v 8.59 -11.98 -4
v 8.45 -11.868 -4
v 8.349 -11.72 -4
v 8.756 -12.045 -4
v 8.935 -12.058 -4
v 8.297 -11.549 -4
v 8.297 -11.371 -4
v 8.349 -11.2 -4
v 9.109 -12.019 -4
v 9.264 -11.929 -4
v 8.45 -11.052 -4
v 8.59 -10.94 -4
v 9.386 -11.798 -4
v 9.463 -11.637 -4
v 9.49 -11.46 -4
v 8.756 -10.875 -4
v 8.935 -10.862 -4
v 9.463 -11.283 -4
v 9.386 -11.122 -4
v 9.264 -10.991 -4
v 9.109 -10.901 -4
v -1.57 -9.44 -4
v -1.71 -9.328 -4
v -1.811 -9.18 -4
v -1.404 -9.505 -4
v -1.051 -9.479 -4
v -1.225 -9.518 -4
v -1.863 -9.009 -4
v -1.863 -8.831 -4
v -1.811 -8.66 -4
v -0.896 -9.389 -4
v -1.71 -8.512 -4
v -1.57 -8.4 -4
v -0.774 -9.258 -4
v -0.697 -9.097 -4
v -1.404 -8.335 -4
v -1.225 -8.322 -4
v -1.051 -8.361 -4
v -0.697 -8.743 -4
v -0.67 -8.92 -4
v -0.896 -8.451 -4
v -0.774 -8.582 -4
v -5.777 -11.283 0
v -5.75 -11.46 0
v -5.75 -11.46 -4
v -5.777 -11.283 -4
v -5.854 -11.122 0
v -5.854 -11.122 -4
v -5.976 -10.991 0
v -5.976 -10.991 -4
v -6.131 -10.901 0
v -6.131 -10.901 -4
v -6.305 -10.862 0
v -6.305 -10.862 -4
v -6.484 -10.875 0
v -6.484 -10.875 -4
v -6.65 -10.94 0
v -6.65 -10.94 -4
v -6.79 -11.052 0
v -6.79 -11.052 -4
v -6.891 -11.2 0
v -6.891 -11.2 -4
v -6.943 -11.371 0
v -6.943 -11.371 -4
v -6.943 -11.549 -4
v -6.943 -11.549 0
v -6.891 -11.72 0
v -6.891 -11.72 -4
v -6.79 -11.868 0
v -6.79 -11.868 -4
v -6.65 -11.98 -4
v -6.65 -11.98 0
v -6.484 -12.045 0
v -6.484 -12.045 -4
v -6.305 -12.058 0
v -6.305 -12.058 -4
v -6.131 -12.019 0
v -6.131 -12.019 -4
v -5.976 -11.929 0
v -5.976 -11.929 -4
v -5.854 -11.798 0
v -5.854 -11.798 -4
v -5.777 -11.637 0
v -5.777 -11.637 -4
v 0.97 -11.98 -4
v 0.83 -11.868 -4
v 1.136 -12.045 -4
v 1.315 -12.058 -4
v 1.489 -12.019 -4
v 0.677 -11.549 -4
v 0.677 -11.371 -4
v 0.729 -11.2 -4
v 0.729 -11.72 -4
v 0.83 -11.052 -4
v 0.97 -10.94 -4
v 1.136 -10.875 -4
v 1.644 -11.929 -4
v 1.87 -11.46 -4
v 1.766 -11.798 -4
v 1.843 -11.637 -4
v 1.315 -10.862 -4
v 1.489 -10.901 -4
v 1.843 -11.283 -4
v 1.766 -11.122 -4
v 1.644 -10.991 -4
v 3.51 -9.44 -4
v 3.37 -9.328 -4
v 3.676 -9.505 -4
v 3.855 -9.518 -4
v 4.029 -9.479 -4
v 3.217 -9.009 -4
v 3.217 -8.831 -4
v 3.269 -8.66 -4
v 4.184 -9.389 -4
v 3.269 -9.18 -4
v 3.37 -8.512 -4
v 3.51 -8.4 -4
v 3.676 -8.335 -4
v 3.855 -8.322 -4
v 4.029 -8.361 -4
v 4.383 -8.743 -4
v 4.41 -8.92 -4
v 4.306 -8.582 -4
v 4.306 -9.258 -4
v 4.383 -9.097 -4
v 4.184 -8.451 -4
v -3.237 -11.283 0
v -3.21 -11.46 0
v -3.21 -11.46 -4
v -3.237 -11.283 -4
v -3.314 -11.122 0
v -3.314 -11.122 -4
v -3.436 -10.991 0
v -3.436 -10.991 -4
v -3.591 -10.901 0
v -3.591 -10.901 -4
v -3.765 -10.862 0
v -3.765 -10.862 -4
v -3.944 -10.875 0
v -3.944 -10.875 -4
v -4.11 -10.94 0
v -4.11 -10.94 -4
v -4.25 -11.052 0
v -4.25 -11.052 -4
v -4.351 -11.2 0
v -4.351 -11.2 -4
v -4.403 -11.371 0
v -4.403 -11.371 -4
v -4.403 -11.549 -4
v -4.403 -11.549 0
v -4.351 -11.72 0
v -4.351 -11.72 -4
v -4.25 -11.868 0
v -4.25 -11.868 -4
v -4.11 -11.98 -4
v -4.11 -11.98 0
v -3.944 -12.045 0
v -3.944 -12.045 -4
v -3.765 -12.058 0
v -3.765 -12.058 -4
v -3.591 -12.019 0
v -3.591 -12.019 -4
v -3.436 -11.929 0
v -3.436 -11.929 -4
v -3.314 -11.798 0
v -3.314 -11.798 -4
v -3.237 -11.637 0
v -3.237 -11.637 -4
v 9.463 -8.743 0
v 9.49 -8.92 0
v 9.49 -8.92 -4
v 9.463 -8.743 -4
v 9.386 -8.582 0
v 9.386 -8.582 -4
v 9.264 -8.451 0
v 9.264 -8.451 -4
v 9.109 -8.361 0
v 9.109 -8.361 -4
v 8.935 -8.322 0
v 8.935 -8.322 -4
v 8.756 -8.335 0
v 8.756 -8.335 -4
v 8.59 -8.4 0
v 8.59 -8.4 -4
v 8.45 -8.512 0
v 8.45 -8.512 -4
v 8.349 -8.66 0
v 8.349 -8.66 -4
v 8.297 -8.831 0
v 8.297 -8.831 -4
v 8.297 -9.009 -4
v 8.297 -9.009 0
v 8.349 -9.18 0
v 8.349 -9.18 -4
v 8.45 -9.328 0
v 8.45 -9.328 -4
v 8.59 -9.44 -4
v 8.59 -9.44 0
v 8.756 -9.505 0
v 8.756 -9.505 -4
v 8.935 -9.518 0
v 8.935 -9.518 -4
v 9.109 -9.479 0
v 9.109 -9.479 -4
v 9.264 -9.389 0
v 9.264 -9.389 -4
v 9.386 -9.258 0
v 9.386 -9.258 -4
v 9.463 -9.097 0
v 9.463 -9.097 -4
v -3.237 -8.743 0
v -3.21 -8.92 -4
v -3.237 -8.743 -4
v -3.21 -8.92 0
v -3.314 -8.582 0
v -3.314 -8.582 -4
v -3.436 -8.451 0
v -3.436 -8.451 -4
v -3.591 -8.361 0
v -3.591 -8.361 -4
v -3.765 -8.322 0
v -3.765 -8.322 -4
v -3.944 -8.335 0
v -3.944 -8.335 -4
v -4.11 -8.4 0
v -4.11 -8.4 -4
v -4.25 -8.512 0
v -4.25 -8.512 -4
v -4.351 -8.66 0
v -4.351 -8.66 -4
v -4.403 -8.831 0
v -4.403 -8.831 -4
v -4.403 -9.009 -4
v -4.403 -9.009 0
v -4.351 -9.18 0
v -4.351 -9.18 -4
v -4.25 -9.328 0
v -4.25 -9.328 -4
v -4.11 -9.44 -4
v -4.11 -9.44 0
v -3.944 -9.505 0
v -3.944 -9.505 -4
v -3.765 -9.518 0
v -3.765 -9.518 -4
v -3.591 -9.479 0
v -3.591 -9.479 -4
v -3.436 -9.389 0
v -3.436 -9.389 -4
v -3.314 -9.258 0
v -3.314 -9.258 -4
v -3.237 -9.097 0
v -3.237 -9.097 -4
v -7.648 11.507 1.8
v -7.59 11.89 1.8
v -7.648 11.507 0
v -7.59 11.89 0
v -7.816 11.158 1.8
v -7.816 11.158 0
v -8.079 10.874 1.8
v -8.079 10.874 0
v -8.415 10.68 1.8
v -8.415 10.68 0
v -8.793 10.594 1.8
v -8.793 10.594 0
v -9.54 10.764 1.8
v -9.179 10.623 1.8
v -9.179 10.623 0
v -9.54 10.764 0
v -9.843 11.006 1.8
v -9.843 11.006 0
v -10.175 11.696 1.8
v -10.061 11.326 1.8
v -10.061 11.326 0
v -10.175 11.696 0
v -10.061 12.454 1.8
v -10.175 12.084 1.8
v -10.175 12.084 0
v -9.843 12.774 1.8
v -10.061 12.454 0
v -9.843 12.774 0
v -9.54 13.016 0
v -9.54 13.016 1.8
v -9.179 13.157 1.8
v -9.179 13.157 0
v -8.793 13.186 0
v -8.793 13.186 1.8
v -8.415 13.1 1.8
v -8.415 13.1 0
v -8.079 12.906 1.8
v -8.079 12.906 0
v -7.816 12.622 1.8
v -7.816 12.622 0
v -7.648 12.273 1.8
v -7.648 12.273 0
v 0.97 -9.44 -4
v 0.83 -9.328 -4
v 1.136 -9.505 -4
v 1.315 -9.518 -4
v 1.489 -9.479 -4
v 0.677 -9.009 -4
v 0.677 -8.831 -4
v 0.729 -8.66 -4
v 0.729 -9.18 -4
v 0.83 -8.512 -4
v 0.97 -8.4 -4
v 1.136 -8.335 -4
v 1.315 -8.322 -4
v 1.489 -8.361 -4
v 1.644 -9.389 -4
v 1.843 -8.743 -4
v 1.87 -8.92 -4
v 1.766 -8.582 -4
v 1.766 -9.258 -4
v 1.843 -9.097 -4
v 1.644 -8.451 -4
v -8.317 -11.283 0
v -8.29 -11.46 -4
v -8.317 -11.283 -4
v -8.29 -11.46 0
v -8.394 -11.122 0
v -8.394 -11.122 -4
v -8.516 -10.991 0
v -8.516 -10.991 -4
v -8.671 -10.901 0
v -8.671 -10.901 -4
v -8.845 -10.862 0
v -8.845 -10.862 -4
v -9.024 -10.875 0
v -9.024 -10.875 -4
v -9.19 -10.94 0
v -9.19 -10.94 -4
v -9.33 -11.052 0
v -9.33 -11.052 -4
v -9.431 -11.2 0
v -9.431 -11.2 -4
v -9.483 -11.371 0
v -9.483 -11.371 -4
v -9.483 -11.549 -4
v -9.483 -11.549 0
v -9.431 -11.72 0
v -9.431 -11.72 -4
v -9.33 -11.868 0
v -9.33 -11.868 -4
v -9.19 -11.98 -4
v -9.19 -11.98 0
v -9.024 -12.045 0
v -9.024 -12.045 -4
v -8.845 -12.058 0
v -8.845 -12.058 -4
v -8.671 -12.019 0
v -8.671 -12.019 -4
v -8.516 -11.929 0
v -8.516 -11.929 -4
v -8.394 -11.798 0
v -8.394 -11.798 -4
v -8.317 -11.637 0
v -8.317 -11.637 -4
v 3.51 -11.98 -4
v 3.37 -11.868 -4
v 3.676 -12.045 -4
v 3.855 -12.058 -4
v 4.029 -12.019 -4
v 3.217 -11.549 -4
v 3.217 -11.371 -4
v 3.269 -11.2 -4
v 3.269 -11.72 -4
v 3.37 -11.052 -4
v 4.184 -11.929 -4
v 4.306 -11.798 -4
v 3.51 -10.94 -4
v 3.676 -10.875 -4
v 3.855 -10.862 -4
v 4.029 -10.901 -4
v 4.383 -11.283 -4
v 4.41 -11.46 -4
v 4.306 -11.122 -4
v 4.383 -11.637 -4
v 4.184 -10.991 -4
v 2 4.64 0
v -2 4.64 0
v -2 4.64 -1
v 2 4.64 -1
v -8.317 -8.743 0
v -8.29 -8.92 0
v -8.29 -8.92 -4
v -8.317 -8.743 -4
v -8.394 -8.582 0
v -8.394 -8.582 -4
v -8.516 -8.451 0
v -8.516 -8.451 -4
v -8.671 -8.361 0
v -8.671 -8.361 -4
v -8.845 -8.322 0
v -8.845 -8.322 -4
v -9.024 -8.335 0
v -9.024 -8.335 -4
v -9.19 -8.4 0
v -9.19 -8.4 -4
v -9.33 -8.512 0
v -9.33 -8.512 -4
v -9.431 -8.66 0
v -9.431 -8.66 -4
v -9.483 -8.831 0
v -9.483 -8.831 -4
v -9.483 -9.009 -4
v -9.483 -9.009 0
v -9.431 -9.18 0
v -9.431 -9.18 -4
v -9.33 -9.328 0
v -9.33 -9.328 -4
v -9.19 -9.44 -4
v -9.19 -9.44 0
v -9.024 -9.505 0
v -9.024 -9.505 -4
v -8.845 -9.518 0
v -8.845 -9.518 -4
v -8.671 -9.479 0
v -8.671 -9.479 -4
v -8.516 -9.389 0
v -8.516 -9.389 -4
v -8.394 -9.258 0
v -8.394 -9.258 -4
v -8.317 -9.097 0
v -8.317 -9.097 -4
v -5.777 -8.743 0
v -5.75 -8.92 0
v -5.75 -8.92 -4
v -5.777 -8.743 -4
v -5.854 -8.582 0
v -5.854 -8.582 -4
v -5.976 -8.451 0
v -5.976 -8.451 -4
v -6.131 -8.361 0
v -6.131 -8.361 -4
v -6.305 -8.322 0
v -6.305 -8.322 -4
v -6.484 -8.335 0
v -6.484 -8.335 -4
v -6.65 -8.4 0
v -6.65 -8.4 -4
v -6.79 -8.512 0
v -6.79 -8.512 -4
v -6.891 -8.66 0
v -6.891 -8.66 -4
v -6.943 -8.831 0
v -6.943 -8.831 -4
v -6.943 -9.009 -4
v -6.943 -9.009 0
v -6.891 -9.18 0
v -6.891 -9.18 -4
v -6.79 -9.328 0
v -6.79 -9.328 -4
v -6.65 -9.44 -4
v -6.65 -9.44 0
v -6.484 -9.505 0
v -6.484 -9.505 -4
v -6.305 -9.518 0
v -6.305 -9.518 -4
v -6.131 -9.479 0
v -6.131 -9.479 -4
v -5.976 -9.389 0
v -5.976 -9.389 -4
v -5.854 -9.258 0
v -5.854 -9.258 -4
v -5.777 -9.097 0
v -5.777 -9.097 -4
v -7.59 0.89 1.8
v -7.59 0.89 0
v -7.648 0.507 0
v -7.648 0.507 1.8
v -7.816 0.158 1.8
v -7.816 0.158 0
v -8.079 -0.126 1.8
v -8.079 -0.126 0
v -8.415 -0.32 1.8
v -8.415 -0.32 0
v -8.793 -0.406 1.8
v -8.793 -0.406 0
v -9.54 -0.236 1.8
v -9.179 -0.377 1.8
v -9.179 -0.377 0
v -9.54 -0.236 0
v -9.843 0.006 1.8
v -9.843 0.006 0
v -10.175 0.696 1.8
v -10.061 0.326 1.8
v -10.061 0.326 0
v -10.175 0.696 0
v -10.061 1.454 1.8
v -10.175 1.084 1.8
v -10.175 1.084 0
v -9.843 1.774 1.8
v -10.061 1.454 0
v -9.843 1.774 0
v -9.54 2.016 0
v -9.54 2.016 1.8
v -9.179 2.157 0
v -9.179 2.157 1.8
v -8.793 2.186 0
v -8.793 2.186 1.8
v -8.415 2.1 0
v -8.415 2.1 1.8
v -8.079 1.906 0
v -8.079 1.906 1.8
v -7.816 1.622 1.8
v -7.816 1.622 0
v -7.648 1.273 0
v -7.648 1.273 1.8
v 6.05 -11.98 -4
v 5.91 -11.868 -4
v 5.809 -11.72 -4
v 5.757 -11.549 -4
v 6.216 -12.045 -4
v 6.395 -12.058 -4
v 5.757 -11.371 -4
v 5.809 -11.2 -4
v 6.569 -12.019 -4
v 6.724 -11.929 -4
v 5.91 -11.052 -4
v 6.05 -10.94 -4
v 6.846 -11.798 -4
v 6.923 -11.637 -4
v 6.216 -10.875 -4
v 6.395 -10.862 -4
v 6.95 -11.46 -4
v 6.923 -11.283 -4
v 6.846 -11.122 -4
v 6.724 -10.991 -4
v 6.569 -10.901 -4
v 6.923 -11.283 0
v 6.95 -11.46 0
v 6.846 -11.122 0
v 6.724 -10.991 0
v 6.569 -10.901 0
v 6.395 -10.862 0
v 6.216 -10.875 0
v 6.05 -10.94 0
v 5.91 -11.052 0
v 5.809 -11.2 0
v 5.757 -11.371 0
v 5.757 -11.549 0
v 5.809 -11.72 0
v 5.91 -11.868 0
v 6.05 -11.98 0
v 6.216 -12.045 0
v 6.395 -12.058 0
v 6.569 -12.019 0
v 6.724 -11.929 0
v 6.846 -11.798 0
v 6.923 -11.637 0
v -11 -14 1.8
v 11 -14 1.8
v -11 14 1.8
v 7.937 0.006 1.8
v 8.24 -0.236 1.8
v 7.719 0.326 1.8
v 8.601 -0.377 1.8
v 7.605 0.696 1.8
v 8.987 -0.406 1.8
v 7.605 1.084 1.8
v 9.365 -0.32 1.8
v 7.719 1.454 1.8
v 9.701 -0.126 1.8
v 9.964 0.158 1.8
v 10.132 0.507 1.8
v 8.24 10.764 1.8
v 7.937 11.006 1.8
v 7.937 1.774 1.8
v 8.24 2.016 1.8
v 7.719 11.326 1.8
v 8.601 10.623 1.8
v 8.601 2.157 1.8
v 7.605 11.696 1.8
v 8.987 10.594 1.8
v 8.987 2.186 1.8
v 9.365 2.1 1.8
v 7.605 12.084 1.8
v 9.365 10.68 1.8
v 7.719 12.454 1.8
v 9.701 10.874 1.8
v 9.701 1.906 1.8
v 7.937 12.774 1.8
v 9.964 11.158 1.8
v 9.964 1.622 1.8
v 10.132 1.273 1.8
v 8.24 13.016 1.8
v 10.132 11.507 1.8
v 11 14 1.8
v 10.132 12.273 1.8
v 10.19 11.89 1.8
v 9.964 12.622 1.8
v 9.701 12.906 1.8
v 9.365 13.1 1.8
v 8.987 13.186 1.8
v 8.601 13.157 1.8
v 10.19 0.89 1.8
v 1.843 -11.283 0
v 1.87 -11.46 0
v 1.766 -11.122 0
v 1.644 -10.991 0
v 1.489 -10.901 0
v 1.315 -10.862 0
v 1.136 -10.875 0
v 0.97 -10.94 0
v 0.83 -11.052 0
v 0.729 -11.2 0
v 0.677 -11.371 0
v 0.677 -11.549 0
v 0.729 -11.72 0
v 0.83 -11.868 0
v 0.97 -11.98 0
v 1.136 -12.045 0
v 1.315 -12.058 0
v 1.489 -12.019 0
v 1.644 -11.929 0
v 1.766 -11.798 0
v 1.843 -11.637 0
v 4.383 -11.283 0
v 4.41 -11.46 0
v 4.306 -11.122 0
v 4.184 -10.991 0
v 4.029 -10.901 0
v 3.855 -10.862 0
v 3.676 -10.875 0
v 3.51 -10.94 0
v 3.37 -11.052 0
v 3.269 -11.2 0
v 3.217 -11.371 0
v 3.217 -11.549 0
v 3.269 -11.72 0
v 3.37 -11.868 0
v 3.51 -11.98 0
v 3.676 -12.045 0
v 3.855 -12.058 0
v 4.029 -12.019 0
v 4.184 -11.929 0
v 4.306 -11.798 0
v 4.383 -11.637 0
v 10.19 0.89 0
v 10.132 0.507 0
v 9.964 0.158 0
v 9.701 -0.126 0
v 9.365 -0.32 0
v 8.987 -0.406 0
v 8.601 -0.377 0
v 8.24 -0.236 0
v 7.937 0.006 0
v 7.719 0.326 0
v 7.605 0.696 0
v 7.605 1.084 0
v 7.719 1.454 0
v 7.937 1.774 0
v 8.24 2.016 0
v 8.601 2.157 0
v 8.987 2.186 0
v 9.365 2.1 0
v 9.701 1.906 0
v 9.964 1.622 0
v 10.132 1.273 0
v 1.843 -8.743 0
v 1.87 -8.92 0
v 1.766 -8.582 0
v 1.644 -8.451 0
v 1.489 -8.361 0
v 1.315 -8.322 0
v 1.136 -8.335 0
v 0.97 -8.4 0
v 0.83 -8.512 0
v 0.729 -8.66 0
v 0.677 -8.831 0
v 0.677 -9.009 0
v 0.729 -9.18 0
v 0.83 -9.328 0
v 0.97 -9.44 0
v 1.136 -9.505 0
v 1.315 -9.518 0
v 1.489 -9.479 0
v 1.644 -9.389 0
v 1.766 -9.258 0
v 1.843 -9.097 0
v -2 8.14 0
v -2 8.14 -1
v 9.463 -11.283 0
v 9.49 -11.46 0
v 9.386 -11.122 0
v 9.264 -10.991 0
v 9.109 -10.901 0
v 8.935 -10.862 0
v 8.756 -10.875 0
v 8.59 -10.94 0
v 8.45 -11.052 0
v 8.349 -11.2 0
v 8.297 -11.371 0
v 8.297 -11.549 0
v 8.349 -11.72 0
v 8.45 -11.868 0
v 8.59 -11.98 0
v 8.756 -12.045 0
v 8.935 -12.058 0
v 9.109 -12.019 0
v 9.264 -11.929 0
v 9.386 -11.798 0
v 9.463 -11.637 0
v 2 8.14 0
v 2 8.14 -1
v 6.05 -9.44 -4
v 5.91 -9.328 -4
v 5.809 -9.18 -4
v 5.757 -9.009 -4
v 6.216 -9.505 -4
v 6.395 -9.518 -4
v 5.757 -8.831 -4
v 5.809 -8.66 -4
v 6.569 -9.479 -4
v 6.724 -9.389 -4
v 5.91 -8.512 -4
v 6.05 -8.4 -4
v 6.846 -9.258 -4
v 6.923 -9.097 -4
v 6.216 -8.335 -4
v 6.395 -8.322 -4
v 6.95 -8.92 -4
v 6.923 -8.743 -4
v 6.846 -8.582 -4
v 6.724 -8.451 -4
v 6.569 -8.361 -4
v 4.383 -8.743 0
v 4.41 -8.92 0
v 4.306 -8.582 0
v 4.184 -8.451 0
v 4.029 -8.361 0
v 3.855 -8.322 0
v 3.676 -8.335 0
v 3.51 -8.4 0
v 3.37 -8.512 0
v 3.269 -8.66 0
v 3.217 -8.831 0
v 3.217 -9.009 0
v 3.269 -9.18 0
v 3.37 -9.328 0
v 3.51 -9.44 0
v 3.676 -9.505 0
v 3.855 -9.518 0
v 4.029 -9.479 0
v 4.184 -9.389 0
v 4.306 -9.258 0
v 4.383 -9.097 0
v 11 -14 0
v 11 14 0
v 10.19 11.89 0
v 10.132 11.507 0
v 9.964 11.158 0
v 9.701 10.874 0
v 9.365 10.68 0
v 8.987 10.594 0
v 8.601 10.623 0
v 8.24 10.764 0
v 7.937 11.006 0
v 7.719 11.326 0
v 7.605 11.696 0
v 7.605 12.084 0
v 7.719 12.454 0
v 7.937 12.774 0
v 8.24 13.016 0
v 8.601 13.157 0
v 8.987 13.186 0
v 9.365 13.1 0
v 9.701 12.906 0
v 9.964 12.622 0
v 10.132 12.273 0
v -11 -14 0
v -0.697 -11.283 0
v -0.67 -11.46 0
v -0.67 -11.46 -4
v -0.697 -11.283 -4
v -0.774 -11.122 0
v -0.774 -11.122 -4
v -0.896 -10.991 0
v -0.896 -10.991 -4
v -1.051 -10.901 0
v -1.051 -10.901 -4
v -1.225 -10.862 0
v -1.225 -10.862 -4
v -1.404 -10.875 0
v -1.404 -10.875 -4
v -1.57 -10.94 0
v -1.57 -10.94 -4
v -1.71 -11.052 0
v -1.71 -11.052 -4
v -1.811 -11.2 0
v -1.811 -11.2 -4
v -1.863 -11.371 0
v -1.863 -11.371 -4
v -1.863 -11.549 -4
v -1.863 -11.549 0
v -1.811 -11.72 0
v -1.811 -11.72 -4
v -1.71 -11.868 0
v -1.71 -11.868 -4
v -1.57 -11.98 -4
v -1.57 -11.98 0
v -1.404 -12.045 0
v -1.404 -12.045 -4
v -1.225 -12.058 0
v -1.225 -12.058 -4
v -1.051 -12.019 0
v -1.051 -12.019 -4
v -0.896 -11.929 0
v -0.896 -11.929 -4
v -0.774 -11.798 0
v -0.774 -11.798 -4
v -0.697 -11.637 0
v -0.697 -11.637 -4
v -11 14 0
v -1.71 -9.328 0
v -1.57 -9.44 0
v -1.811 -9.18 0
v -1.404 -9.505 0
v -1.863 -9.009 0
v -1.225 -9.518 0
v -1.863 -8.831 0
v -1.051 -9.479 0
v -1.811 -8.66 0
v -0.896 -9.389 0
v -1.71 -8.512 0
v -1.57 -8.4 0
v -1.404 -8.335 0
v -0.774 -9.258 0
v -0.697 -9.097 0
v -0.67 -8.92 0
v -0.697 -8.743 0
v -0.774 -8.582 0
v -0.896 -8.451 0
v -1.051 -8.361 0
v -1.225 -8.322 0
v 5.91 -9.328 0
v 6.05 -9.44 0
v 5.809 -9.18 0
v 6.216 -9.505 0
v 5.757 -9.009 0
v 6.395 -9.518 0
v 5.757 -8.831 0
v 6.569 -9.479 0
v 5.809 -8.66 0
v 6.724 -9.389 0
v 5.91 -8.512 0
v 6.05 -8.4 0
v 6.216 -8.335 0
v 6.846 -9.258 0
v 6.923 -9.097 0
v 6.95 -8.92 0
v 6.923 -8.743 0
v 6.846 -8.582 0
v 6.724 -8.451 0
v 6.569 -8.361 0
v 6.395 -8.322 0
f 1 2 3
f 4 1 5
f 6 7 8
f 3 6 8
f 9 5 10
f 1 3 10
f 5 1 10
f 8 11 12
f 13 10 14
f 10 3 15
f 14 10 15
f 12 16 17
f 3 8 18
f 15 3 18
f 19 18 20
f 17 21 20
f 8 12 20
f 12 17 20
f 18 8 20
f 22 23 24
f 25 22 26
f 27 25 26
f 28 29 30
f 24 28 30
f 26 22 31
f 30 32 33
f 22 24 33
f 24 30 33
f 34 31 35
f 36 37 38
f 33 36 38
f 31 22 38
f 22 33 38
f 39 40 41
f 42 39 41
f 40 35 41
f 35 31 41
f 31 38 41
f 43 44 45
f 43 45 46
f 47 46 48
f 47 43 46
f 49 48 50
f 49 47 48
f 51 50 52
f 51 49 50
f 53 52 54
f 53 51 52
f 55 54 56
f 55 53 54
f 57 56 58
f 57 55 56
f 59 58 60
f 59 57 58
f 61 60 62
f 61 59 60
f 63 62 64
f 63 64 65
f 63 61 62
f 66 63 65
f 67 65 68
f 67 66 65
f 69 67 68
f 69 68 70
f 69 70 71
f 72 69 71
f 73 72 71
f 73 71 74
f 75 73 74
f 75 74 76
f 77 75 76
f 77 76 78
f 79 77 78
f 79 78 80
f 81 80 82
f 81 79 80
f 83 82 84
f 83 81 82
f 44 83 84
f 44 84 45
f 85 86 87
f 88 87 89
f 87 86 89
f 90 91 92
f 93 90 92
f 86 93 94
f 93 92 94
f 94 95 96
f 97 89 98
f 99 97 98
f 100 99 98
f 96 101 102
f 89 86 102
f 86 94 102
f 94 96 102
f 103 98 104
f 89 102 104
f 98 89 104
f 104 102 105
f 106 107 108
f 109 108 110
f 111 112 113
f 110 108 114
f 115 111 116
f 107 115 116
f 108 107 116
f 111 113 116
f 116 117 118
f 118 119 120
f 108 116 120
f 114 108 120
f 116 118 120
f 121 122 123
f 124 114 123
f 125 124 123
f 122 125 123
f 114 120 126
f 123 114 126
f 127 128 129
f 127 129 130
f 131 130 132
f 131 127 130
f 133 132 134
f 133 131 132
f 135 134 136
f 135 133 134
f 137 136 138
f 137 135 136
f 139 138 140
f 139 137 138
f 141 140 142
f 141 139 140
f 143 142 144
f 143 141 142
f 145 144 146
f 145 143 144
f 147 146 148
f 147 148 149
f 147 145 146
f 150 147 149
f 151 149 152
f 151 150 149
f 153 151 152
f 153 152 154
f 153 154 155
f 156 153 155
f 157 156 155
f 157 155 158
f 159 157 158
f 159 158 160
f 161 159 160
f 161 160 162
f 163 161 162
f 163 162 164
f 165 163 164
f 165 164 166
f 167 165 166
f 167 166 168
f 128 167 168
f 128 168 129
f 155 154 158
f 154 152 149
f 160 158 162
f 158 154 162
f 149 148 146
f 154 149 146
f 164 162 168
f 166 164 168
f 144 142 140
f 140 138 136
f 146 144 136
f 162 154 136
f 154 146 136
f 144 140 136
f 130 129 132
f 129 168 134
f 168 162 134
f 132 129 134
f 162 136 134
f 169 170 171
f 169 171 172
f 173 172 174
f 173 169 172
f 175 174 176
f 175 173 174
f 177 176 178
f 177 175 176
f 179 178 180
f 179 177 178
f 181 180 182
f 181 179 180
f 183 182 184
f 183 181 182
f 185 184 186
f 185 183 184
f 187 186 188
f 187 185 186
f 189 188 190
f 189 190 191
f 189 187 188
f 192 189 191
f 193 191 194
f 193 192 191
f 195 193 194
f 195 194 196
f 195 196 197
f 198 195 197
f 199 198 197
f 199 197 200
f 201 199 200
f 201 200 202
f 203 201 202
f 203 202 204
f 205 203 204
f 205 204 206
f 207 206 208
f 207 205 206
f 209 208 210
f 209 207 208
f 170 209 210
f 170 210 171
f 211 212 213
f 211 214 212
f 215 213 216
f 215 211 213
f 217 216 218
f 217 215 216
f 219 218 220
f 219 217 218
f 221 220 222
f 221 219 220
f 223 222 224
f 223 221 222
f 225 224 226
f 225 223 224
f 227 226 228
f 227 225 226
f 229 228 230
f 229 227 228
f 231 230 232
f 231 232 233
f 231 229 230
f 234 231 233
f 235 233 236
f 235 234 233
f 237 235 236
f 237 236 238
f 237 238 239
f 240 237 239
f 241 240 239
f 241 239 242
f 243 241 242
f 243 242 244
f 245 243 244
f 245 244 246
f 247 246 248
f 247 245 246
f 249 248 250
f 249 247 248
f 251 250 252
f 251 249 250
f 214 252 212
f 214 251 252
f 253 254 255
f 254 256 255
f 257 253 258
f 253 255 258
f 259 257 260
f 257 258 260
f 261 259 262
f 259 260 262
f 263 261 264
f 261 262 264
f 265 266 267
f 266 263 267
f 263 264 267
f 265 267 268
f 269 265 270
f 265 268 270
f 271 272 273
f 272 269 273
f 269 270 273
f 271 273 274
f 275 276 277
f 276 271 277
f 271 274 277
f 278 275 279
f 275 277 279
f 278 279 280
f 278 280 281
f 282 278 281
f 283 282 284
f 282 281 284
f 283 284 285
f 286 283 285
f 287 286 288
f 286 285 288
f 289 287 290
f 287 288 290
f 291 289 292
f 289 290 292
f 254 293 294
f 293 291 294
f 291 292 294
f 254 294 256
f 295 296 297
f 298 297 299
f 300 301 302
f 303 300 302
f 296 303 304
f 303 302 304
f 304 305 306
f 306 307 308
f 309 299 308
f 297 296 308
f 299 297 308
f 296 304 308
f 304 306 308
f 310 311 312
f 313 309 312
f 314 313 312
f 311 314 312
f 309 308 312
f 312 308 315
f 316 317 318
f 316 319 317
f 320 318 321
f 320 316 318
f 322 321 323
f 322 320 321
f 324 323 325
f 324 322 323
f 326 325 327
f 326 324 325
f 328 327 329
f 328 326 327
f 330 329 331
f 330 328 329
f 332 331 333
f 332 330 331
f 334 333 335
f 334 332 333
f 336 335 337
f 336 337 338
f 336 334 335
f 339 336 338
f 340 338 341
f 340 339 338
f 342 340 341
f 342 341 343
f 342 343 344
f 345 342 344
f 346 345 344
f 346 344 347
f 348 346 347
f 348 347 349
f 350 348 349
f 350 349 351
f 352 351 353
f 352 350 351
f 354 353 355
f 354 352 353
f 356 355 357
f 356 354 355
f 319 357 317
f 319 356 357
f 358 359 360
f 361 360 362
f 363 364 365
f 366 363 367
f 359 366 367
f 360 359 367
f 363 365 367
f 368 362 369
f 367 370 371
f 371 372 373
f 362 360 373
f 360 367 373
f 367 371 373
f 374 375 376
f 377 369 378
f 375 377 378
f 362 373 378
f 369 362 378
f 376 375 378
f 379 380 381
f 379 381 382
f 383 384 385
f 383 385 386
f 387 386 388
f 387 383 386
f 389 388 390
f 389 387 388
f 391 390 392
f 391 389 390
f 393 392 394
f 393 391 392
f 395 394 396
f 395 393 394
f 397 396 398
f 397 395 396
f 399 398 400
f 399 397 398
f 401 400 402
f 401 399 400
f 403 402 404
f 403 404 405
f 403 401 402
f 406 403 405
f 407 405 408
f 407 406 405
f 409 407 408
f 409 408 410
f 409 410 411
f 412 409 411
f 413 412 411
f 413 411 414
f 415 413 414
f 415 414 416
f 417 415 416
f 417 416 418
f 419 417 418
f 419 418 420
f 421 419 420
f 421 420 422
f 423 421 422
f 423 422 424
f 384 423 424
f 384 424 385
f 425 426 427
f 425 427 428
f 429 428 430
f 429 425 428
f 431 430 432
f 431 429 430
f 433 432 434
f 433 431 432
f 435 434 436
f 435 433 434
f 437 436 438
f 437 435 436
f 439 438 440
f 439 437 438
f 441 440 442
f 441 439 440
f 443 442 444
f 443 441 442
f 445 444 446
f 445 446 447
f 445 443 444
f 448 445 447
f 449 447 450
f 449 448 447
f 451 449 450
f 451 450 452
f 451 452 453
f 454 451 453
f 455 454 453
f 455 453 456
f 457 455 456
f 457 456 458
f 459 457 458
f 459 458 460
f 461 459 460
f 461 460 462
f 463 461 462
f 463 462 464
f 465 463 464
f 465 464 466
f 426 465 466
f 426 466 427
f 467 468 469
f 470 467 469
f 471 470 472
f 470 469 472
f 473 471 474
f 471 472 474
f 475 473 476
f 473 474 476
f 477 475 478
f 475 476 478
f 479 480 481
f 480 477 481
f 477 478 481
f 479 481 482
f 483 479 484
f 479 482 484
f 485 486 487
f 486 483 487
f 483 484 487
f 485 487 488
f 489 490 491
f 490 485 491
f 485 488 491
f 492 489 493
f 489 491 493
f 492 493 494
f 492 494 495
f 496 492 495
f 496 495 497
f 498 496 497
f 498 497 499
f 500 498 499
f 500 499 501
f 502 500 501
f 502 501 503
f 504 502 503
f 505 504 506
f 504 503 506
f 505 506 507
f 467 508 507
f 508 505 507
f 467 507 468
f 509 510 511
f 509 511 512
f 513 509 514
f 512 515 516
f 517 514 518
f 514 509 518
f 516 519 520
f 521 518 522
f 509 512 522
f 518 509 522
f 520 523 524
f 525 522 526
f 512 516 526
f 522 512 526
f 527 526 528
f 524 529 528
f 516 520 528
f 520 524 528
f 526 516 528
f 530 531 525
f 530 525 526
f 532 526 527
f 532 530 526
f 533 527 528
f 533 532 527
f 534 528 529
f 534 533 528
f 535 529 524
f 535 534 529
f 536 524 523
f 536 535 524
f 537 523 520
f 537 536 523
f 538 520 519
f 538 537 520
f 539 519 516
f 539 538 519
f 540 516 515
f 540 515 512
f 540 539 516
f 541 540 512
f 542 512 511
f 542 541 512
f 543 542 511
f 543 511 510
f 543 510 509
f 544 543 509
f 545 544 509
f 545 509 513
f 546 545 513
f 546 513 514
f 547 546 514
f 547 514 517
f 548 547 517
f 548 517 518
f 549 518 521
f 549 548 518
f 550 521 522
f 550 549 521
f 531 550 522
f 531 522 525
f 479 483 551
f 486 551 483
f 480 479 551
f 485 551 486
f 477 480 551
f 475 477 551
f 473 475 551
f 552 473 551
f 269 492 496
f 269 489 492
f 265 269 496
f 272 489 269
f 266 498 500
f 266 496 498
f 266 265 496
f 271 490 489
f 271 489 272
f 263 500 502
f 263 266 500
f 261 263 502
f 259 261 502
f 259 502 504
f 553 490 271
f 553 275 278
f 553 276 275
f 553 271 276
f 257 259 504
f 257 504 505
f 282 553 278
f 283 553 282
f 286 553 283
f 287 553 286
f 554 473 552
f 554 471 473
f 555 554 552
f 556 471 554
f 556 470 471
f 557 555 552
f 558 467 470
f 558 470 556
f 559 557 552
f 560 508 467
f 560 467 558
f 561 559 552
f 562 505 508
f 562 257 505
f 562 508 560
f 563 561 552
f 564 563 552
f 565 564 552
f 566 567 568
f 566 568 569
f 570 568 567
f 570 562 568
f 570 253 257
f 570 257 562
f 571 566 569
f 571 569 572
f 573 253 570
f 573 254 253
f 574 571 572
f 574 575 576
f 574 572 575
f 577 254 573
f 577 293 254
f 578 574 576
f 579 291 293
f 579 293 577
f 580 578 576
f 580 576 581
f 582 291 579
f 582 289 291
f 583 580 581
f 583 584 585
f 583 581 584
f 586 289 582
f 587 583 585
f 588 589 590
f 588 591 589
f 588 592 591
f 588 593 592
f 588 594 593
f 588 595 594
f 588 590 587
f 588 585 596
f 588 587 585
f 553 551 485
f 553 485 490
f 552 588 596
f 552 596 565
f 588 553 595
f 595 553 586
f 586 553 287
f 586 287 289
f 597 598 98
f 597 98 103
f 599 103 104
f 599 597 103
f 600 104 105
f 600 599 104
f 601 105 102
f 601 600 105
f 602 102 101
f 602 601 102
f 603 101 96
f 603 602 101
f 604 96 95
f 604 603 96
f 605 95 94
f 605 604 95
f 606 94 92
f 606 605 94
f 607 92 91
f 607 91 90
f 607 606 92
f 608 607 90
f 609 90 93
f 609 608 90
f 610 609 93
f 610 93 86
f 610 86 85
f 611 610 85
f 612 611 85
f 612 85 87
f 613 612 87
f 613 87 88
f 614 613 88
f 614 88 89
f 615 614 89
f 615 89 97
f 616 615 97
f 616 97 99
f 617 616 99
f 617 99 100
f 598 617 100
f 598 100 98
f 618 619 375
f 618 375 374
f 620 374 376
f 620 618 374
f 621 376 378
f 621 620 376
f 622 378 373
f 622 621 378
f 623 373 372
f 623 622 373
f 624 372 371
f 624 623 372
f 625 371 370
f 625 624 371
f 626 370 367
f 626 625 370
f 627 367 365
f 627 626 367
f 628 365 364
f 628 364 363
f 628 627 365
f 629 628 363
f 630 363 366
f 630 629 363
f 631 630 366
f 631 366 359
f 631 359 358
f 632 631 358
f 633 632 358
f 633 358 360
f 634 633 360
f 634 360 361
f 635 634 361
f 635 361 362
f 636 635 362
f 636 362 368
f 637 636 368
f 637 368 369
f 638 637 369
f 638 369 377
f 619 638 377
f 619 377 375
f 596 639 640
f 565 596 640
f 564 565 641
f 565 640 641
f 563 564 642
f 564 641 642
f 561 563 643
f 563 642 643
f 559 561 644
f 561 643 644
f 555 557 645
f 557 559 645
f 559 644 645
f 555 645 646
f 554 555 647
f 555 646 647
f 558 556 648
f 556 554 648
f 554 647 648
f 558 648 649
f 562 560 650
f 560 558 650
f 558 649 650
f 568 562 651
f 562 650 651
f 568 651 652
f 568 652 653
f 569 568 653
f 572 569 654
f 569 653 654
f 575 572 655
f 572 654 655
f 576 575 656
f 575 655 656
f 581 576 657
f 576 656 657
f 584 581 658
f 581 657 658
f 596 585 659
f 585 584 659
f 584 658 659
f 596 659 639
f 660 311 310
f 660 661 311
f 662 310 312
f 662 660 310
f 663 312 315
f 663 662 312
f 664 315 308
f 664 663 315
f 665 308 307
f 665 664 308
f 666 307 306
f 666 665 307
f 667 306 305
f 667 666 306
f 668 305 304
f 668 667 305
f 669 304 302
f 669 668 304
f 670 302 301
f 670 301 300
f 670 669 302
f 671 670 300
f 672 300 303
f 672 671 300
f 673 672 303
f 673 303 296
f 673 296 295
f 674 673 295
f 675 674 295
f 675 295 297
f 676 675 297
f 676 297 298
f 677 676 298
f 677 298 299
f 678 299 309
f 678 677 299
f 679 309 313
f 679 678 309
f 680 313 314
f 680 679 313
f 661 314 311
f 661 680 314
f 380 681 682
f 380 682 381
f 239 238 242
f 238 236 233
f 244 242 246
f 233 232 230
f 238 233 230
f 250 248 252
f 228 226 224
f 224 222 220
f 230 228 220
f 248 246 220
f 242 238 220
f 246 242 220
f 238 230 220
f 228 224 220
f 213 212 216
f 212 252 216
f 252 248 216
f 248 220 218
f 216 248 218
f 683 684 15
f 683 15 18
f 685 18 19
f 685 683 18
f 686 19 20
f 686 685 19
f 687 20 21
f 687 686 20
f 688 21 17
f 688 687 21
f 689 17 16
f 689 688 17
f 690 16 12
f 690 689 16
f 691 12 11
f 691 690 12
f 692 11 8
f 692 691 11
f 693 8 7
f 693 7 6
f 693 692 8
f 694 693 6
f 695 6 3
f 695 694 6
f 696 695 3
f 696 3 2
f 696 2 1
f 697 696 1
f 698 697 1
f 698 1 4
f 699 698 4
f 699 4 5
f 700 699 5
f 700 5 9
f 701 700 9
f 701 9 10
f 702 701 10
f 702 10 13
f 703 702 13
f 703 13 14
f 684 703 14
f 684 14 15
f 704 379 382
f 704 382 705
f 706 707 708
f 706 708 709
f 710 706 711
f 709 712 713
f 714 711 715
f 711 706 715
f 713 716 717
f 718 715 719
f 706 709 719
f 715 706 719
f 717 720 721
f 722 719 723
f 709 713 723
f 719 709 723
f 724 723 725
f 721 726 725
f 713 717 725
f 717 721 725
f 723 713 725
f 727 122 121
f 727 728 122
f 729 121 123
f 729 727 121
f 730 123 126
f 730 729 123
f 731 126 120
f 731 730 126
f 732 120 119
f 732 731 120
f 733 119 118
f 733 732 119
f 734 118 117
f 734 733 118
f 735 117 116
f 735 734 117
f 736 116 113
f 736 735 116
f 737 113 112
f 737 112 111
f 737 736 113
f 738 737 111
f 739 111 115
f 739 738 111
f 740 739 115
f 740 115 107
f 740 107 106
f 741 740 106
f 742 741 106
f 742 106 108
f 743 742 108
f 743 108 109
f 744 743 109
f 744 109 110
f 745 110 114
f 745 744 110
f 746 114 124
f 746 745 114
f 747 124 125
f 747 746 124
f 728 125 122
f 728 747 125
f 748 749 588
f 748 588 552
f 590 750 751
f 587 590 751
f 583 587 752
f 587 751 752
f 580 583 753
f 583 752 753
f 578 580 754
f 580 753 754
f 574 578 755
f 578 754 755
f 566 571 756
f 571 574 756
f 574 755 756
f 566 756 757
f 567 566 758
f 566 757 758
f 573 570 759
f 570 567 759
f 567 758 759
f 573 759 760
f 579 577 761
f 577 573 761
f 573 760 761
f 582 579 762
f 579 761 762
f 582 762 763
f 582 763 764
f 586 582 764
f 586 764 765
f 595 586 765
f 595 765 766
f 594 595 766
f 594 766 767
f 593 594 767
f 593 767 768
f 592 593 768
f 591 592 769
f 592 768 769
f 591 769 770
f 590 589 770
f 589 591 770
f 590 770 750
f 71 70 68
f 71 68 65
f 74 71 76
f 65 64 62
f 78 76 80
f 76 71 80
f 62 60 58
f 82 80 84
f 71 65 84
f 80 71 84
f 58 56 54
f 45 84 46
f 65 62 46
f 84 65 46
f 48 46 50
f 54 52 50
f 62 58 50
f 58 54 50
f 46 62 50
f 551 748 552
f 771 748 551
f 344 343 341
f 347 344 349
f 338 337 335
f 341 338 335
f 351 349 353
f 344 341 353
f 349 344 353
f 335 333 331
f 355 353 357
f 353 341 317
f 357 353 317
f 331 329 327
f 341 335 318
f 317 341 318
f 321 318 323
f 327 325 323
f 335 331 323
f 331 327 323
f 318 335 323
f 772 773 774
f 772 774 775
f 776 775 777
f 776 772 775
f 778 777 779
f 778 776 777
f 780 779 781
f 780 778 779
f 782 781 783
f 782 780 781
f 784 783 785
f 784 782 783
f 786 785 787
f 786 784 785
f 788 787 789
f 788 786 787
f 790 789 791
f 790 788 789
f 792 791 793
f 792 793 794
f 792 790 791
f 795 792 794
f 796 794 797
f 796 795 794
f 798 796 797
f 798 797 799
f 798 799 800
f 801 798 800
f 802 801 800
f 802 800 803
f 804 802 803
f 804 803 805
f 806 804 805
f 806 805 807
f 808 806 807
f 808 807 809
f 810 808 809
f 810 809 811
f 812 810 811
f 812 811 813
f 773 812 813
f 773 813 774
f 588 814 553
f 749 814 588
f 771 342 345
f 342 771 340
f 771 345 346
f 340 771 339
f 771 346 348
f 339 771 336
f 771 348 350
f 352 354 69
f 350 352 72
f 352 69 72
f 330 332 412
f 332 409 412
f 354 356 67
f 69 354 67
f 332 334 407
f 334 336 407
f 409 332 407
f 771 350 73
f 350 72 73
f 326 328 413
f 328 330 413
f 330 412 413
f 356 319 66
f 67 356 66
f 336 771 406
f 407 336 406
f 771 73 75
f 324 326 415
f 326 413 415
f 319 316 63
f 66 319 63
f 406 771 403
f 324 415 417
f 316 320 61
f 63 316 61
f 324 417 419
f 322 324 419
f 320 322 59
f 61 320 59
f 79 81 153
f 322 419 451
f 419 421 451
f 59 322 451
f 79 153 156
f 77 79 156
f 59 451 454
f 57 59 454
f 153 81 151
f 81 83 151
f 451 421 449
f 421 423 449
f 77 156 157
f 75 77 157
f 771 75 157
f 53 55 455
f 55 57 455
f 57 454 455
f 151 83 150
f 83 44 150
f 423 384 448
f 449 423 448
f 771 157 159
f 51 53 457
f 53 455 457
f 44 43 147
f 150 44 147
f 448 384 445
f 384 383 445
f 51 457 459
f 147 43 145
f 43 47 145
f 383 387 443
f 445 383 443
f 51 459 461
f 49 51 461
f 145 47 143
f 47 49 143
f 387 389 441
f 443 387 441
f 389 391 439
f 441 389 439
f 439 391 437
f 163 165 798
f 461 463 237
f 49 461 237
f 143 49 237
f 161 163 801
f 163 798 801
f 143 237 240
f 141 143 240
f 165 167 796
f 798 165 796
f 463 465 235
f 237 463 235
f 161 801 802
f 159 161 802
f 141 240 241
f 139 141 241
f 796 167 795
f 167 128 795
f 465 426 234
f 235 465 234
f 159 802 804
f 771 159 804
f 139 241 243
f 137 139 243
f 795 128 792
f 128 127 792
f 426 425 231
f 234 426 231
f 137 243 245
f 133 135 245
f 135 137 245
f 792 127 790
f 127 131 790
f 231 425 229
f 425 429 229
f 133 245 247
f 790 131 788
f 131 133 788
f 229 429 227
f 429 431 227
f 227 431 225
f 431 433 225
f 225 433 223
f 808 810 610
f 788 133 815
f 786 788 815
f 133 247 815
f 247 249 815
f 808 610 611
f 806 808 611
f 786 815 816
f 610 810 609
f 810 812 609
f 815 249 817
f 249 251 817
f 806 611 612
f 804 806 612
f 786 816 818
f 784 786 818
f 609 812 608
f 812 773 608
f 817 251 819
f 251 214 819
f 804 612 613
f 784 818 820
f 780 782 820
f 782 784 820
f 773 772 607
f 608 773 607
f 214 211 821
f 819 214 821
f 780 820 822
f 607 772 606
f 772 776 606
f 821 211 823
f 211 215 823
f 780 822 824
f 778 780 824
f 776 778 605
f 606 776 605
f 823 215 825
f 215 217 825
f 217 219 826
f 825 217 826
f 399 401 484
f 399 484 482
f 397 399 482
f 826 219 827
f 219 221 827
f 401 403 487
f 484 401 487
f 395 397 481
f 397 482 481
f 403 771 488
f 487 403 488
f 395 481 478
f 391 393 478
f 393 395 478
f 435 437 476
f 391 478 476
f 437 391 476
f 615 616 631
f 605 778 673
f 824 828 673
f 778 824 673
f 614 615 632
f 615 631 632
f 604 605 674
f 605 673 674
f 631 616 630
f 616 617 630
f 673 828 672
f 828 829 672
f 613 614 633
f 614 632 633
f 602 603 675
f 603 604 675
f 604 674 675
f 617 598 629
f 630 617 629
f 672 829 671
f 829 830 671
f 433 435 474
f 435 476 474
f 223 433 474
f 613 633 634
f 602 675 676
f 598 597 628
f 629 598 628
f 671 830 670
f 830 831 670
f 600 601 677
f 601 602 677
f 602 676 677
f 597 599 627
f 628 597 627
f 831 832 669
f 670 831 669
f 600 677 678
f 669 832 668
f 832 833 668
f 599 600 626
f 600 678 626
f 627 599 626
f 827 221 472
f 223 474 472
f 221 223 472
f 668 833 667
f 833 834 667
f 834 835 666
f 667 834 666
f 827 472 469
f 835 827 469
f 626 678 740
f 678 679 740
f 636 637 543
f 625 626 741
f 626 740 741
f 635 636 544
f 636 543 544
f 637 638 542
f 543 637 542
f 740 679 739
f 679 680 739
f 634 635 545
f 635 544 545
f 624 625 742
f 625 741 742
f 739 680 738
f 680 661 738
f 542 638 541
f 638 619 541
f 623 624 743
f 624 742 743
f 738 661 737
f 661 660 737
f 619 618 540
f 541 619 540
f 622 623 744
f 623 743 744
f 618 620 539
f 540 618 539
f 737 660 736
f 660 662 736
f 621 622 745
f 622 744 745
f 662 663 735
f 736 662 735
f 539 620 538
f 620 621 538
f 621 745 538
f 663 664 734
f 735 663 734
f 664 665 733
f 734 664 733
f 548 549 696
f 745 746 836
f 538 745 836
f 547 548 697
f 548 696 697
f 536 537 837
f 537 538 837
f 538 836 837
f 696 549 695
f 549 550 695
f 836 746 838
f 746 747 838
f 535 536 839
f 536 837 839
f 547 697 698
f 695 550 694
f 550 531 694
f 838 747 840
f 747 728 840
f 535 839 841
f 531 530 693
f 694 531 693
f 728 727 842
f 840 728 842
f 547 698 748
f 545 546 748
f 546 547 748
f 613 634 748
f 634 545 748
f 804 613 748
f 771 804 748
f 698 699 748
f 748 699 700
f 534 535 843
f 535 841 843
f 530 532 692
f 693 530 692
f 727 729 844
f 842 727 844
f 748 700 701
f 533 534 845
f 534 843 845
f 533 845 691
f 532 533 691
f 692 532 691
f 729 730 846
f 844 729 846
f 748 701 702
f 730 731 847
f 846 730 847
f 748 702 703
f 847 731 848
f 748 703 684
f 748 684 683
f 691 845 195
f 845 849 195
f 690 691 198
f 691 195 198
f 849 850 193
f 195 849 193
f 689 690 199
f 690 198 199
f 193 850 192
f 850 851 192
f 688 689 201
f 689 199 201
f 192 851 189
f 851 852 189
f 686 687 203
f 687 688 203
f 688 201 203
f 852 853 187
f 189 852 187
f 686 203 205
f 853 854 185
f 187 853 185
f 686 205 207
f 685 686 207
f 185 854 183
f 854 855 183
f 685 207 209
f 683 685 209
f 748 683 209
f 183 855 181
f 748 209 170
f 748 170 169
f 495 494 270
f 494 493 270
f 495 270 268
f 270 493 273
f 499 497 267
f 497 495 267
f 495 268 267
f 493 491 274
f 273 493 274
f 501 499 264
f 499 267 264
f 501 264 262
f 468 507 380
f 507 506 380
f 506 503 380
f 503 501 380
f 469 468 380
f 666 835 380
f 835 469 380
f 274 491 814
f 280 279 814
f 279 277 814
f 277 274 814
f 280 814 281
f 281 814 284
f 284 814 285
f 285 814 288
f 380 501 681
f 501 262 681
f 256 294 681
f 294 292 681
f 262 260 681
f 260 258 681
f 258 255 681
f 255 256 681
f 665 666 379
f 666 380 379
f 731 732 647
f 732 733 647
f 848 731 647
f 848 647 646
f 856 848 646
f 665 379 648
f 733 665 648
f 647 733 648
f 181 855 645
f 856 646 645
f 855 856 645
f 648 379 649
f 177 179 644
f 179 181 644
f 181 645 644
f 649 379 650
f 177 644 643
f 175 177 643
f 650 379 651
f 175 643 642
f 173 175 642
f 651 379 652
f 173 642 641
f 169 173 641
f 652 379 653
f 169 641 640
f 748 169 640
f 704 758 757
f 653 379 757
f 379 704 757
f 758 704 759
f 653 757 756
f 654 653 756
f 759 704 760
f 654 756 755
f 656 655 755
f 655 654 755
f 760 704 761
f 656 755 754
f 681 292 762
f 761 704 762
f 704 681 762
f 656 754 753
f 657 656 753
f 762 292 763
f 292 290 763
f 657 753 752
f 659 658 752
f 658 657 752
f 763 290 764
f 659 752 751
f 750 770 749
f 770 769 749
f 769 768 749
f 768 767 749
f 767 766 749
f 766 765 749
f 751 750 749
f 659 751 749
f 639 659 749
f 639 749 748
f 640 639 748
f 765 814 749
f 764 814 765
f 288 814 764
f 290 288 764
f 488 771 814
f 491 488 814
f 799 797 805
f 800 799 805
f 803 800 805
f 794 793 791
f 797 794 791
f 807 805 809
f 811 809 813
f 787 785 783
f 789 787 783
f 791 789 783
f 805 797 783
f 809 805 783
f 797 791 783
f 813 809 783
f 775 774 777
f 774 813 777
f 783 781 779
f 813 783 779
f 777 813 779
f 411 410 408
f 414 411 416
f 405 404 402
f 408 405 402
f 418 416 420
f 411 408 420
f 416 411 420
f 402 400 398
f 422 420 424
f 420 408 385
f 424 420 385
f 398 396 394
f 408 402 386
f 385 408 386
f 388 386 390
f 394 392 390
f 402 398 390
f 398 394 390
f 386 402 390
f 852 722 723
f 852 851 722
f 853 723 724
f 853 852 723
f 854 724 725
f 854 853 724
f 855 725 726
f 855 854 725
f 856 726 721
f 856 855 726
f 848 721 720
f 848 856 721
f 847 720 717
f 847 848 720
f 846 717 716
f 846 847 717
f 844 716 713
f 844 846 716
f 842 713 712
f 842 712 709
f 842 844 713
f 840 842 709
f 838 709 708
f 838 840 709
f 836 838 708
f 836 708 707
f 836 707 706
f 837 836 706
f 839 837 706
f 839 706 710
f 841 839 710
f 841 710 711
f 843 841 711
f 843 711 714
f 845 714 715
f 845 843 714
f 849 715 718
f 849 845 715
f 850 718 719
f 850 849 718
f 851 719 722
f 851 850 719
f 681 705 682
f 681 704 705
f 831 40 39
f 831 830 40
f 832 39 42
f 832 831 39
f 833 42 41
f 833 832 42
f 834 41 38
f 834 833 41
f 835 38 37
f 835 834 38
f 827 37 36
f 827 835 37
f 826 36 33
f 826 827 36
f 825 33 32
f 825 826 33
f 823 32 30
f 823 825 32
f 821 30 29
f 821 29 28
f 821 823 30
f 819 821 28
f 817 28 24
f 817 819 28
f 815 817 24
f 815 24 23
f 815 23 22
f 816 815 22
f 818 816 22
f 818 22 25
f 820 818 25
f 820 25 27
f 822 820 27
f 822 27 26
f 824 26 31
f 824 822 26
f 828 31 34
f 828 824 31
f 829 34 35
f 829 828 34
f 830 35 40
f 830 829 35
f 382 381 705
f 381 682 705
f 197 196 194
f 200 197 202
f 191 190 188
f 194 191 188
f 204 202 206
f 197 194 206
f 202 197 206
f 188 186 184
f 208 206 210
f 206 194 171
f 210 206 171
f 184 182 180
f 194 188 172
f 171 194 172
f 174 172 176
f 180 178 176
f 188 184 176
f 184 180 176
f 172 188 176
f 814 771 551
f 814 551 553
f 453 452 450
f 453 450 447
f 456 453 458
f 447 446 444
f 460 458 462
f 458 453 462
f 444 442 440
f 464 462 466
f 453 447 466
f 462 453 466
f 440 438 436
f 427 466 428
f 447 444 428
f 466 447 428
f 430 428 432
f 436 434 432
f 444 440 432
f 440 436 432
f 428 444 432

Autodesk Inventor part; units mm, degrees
ref_plane "YZ Plane" through (0, 0, 0) normal (1, 0, 0) x (0, 1, 0)
ref_plane "XZ Plane" through (0, 0, 0) normal (0, 1, 0) x (-1, 0, 0)
ref_plane "XY Plane" through (0, 0, 0) normal (0, 0, 1) x (1, 0, 0)
sketch "Skizze1" plane through (0, 0, 0) normal (0, 0, 1) x (1, 0, 0)
  line L0 (-11, 14) -> (11, 14)
  line L1 (11, 14) -> (11, -14)
  line L2 (11, -14) -> (-11, -14)
  line L3 (-11, -14) -> (-11, 14)
  line L4 (0, 19.6) -> (0, -19.6) construction
  line L5 (-15.4, 0) -> (15.4, 0) construction
  line L6 (-8.89, 0.89) -> (8.89, 0.89) construction
  line L7 (8.89, 0.89) -> (8.89, 11.89) construction
  line L8 (8.89, 11.89) -> (-8.89, 11.89) construction
  line L9 (-8.89, 11.89) -> (-8.89, 0.89) construction
  circle A0 centre (-8.89, 0.89) radius 1.3
  circle A1 centre (8.89, 0.89) radius 1.3
  circle A2 centre (8.89, 11.89) radius 1.3
  circle A3 centre (-8.89, 11.89) radius 1.3
  line L10 (-11, 14) -> (-8.89, 11.89) construction
  line L11 (-8.89, -11.46) -> (8.89, -11.46) construction
  line L12 (8.89, -11.46) -> (8.89, -8.92) construction
  line L13 (8.89, -8.92) -> (-8.89, -8.92) construction
  line L14 (-8.89, -8.92) -> (-8.89, -11.46) construction
  circle A4 centre (-8.89, -11.46) radius 0.6
  circle A5 centre (-6.35, -11.46) radius 0.6
  circle A6 centre (-3.81, -11.46) radius 0.6
  circle A7 centre (-1.27, -11.46) radius 0.6
  circle A8 centre (1.27, -11.46) radius 0.6
  circle A9 centre (3.81, -11.46) radius 0.6
  circle A10 centre (6.35, -11.46) radius 0.6
  circle A11 centre (8.89, -11.46) radius 0.6
  circle A12 centre (-8.89, -8.92) radius 0.6
  circle A13 centre (-6.35, -8.92) radius 0.6
  circle A14 centre (-3.81, -8.92) radius 0.6
  circle A15 centre (-1.27, -8.92) radius 0.6
  circle A16 centre (1.27, -8.92) radius 0.6
  circle A17 centre (3.81, -8.92) radius 0.6
  circle A18 centre (6.35, -8.92) radius 0.6
  circle A19 centre (8.89, -8.92) radius 0.6
  line L15 (-2, 4.64) -> (2, 4.64)
  line L16 (2, 4.64) -> (2, 8.14)
  line L17 (2, 8.14) -> (-2, 8.14)
  line L18 (-2, 8.14) -> (-2, 4.64)
  line L19 (-8.89, 0.89) -> (8.89, 11.89) construction
  line L20 (-8.89, 11.89) -> (8.89, 0.89) construction
  line L21 (-8.89, 6.39) -> (8.89, 6.39) construction
  point P0 (0, 0)
  point P1 (0, 6.39)
  dimension "d0" = 22
  dimension "d1" = 28
  dimension "d2" = 11
  dimension "d3" = 17.78
  dimension "d4" = 2.6
  dimension "d5" = 135
  dimension "d6" = 2.54
  dimension "d9" = 2.54
  dimension "d12" = 2.54
  dimension "d15" = 4
  dimension "d16" = 3.5
  dimension "d17" = 2.54
  dimension "d18" = 1.2
extrude "Extrusion1" add sketch "Skizze1" along normal blind 1.8 contours L0 L1 L2 L3 | A4 | A5 | A6 | A7 | A8 | A9 | A10 | A11 | A12 | A13 | A14 | A15 | A16 | A17 | A18 | A19 | L18 L17 L16 L15
extrude "Extrusion2" add sketch "Skizze1" against normal blind 4 from surface at 0 contours A4 | A5 | A6 | A7 | A8 | A9 | A10 | A11 | A12 | A13 | A14 | A15 | A16 | A17 | A18 | A19
extrude "Extrusion3" add sketch "Skizze1" against normal blind 1 from surface at 0 contours L18 L17 L16 L15
properties part number "AS5047D"
